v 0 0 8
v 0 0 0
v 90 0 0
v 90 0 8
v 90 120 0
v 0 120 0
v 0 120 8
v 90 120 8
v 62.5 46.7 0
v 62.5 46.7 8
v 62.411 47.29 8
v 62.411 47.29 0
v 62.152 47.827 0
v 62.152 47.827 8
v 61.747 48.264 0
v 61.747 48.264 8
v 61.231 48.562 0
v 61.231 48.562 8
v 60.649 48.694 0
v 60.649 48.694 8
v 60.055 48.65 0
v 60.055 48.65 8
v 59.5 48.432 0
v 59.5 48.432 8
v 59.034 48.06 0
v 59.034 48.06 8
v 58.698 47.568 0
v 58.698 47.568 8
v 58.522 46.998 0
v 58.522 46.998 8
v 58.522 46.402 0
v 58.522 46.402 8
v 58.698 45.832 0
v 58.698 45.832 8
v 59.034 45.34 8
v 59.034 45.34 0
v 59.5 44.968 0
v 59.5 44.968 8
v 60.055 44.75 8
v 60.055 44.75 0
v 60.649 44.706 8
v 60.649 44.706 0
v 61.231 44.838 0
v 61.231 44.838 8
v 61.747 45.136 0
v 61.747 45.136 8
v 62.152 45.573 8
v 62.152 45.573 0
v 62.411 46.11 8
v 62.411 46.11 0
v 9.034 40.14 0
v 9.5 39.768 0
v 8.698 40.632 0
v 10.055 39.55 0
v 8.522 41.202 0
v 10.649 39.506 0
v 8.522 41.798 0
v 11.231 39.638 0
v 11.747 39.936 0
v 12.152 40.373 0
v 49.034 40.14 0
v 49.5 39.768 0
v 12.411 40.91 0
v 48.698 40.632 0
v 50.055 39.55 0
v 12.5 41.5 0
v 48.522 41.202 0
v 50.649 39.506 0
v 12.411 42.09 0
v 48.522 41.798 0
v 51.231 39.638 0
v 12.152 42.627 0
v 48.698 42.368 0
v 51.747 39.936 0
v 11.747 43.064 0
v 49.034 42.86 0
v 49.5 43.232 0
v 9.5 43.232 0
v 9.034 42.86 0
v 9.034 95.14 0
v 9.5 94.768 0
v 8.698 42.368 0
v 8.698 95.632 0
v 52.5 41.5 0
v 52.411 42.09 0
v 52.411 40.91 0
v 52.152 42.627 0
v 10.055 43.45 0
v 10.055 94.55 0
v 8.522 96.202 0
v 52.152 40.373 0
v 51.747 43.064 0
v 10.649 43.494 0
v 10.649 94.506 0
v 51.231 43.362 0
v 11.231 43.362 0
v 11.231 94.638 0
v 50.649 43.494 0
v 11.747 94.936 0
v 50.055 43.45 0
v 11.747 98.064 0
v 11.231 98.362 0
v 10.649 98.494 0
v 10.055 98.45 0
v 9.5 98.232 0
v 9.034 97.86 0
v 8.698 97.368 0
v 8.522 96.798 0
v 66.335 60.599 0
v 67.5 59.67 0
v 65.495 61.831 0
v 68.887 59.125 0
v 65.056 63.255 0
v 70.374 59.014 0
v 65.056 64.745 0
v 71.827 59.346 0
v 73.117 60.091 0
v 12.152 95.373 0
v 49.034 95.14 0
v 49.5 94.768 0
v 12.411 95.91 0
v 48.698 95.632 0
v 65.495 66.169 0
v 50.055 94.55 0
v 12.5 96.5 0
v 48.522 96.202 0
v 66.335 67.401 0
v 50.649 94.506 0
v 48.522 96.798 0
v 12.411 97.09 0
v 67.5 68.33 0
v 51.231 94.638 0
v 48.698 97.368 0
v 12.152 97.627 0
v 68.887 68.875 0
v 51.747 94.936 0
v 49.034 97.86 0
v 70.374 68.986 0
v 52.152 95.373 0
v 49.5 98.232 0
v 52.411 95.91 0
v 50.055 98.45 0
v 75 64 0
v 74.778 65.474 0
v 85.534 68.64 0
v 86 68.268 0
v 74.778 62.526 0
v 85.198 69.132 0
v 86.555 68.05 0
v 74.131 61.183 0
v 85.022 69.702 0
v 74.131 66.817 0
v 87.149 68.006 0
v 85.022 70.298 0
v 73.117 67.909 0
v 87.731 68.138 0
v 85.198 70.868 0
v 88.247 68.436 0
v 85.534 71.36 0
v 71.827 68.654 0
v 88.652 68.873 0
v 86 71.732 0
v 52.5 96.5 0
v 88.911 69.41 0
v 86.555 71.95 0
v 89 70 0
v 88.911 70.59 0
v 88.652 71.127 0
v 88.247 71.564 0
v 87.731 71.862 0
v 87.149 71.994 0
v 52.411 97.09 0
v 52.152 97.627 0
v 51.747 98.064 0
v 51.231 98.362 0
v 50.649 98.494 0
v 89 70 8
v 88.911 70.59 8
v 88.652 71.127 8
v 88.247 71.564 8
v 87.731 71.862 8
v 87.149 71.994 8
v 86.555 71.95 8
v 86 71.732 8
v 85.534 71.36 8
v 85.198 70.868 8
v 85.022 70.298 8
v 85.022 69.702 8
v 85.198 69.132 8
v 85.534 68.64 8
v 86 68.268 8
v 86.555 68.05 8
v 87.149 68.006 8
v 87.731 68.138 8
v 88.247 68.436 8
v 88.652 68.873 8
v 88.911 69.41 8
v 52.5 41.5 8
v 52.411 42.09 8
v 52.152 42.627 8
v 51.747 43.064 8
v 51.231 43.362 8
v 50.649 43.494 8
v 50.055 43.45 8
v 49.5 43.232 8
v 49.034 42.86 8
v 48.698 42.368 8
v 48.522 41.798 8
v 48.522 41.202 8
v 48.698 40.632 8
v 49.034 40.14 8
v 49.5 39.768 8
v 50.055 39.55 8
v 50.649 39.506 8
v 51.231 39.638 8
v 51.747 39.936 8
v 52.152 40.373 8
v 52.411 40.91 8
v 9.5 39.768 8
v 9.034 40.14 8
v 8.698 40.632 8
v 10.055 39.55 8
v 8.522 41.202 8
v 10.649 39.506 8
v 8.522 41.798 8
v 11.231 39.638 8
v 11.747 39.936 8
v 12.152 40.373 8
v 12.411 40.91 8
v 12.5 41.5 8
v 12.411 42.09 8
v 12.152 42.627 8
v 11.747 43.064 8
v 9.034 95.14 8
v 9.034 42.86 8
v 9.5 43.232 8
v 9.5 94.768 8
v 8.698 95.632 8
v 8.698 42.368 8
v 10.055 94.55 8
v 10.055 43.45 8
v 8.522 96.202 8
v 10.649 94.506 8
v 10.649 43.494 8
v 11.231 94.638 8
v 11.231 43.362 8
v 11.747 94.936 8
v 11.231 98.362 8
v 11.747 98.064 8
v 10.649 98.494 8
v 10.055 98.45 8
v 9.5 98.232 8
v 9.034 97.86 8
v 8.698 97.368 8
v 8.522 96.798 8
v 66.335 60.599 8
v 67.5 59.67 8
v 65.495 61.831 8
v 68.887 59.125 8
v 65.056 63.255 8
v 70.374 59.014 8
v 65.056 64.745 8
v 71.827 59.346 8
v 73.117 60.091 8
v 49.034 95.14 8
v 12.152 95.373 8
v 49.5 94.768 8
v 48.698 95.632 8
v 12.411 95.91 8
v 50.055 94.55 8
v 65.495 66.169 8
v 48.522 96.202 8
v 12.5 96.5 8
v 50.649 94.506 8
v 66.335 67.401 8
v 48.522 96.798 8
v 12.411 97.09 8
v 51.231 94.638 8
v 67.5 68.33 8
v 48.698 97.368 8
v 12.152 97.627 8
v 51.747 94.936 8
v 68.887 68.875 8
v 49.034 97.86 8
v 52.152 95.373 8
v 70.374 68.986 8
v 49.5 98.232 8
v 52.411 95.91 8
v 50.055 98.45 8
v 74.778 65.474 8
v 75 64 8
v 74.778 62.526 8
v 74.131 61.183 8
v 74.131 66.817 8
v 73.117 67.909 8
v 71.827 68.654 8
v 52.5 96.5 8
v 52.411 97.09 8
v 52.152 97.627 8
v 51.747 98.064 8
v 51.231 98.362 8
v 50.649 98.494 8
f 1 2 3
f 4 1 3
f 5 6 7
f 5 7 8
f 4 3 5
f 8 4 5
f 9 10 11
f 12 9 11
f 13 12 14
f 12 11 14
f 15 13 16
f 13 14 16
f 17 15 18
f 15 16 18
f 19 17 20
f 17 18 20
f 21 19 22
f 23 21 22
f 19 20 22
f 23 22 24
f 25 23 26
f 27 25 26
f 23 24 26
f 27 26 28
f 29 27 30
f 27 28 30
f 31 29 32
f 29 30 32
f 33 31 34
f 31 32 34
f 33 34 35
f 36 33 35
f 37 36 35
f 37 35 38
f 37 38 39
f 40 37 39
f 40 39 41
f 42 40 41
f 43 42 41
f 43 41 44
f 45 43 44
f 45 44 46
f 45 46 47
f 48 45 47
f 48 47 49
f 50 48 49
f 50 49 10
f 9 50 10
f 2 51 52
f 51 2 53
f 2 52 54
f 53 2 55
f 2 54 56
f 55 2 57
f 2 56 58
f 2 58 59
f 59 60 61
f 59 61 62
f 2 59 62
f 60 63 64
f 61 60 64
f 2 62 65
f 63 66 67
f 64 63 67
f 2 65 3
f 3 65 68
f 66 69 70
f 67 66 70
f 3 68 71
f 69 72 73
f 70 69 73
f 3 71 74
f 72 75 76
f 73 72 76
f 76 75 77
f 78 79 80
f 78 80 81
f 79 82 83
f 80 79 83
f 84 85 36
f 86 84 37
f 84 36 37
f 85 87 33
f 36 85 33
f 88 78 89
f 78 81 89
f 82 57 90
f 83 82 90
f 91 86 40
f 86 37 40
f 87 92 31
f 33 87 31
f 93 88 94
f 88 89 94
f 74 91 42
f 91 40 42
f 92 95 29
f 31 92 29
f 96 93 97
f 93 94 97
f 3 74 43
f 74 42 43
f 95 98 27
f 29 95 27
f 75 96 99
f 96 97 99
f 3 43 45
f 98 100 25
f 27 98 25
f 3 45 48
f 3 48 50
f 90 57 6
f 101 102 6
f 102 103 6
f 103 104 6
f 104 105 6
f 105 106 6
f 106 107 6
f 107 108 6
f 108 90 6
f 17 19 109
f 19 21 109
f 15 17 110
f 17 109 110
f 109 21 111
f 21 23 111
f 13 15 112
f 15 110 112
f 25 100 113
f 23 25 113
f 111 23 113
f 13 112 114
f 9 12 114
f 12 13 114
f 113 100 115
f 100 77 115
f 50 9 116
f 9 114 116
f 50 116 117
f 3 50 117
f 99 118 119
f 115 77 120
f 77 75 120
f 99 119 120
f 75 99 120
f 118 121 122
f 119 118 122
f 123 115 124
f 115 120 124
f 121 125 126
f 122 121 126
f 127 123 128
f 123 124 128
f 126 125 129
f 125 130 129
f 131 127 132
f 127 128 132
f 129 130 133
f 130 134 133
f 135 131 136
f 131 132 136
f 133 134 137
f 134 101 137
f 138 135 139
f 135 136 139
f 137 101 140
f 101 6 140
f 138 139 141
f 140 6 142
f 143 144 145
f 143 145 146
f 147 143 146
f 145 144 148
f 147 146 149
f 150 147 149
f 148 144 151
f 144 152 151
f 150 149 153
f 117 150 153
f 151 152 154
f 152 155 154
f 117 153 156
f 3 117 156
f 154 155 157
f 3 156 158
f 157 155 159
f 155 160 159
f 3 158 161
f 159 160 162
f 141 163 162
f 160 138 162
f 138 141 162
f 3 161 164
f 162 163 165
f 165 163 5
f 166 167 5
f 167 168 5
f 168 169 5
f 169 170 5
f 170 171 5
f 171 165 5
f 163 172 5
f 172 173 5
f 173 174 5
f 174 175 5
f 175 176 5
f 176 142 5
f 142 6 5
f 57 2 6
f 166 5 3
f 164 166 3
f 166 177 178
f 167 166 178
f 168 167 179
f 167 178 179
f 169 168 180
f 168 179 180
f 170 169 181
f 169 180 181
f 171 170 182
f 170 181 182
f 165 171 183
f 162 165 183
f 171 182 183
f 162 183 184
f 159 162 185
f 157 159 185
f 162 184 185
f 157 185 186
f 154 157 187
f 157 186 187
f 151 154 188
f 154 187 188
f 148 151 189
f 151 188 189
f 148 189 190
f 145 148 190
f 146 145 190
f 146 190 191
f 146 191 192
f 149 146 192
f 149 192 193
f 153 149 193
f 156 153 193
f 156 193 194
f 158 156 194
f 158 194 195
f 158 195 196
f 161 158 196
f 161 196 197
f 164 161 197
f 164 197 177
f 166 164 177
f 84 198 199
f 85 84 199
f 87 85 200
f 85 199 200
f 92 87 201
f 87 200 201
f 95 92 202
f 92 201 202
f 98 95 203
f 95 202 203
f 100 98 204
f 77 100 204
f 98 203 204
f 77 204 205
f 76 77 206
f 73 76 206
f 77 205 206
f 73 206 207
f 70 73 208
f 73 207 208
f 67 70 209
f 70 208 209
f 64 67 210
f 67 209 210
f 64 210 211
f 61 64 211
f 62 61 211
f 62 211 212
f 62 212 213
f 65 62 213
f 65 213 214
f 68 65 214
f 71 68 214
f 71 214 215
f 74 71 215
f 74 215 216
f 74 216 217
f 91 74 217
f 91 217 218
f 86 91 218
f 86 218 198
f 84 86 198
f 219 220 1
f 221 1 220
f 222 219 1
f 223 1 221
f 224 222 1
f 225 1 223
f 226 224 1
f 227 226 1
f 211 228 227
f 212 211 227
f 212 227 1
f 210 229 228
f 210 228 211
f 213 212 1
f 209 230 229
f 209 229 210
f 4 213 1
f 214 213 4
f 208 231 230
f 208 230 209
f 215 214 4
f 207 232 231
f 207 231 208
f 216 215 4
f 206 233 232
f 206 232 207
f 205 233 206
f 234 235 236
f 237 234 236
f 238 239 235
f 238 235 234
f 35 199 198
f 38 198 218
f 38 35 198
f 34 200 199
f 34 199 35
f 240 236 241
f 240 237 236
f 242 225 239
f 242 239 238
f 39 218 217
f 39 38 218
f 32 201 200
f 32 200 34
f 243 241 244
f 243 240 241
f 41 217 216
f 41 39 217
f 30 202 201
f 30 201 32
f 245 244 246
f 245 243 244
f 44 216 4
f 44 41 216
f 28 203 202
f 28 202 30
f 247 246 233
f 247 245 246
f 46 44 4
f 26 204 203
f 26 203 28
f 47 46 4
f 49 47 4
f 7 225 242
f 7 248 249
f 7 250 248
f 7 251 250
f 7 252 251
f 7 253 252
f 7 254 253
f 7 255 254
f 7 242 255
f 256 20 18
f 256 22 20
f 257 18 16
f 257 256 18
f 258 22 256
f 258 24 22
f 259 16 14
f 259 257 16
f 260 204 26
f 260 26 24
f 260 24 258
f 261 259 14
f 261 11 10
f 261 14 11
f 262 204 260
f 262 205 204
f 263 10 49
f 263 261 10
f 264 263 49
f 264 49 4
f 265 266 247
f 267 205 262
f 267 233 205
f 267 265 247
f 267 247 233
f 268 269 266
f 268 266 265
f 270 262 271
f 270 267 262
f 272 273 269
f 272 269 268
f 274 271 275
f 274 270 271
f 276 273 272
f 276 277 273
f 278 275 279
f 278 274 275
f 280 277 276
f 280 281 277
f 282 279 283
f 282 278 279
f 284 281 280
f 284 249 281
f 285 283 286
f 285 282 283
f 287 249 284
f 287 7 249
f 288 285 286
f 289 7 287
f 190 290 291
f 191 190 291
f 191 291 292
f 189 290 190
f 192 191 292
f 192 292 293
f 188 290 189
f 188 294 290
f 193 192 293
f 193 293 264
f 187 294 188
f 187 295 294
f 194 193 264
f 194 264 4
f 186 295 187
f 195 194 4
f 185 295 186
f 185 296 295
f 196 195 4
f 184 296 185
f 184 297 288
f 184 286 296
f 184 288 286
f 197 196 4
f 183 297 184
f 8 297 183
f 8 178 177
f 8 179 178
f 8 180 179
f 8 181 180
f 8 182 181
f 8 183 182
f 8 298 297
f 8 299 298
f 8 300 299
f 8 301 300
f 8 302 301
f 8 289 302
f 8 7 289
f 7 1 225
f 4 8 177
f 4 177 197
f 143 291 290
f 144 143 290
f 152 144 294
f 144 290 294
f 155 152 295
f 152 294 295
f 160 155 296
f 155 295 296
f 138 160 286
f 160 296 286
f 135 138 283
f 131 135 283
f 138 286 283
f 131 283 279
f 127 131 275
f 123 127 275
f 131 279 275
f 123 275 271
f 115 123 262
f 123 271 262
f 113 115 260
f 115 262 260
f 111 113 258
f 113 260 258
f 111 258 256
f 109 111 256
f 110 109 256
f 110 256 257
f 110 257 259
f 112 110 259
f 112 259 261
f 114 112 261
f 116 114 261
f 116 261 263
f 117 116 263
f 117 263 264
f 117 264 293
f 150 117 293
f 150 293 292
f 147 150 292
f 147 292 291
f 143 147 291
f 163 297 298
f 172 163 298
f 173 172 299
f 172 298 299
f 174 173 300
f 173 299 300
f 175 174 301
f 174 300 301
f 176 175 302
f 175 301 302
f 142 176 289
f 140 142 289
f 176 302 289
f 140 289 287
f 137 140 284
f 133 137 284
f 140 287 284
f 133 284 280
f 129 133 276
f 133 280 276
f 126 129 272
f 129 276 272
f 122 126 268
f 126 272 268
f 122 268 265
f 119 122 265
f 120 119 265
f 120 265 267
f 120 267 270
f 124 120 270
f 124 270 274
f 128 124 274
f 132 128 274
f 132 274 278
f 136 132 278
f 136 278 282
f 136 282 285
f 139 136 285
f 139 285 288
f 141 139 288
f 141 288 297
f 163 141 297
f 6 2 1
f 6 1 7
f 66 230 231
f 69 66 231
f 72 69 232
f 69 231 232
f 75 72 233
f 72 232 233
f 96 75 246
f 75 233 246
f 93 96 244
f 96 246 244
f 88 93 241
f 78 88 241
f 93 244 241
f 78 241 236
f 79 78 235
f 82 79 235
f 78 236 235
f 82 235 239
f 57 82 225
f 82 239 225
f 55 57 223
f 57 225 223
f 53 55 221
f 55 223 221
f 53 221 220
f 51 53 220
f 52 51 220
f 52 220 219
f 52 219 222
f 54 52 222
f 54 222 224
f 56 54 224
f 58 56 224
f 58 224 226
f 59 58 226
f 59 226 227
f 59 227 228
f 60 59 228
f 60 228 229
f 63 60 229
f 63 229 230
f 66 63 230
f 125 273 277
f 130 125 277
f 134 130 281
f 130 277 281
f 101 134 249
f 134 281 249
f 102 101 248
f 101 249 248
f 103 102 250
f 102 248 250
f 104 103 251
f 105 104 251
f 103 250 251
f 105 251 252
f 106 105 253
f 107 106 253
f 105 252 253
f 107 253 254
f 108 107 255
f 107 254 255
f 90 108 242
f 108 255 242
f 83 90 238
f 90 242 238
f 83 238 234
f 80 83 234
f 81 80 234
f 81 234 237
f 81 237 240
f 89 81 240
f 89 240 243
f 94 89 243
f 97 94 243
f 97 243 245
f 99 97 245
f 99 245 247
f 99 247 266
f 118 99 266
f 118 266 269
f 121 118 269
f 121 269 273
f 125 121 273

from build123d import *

# Parameters (mm, degrees)
SKETCH1_W           = 90
SKETCH1_H           = 120
BOSS_EXTRUDE1_DEPTH = 8
SKETCH2_R           = 5
CUT_EXTRUDE1_DEPTH  = 9
SKETCH3_R           = 2
CUT_EXTRUDE2_DEPTH  = 9
SKETCH4_R           = 2
CUT_EXTRUDE3_DEPTH  = 9


with BuildPart() as part:
    # Sketch1 → Boss-Extrude1 (new body)
    with BuildSketch(Plane.XY):
        with Locations((45, 60)):
            Rectangle(SKETCH1_W, SKETCH1_H)
    extrude(amount=BOSS_EXTRUDE1_DEPTH)

    # Sketch2 → Cut-Extrude1 (cut, through all)
    with BuildSketch(Plane.XY.offset(8)):
        with Locations((70, 64)):
            Circle(SKETCH2_R)
    extrude(amount=-CUT_EXTRUDE1_DEPTH, mode=Mode.SUBTRACT)

    # Sketch3 → Cut-Extrude2 (cut, through all)
    with BuildSketch(Plane.XY.offset(8)):
        with Locations((87, 70)):
            Circle(SKETCH3_R)
        with Locations((60.5, 46.7)):
            Circle(SKETCH3_R)
    extrude(amount=-CUT_EXTRUDE2_DEPTH, mode=Mode.SUBTRACT)

    # Sketch4 → Cut-Extrude3 (cut, through all)
    with BuildSketch(Plane.XY.offset(8)):
        with Locations((50.5, 96.5)):
            Circle(SKETCH4_R)
        with Locations((10.5, 96.5)):
            Circle(SKETCH4_R)
        with Locations((50.5, 41.5)):
            Circle(SKETCH4_R)
        with Locations((10.5, 41.5)):
            Circle(SKETCH4_R)
    extrude(amount=-CUT_EXTRUDE3_DEPTH, mode=Mode.SUBTRACT)


solid = part.part
